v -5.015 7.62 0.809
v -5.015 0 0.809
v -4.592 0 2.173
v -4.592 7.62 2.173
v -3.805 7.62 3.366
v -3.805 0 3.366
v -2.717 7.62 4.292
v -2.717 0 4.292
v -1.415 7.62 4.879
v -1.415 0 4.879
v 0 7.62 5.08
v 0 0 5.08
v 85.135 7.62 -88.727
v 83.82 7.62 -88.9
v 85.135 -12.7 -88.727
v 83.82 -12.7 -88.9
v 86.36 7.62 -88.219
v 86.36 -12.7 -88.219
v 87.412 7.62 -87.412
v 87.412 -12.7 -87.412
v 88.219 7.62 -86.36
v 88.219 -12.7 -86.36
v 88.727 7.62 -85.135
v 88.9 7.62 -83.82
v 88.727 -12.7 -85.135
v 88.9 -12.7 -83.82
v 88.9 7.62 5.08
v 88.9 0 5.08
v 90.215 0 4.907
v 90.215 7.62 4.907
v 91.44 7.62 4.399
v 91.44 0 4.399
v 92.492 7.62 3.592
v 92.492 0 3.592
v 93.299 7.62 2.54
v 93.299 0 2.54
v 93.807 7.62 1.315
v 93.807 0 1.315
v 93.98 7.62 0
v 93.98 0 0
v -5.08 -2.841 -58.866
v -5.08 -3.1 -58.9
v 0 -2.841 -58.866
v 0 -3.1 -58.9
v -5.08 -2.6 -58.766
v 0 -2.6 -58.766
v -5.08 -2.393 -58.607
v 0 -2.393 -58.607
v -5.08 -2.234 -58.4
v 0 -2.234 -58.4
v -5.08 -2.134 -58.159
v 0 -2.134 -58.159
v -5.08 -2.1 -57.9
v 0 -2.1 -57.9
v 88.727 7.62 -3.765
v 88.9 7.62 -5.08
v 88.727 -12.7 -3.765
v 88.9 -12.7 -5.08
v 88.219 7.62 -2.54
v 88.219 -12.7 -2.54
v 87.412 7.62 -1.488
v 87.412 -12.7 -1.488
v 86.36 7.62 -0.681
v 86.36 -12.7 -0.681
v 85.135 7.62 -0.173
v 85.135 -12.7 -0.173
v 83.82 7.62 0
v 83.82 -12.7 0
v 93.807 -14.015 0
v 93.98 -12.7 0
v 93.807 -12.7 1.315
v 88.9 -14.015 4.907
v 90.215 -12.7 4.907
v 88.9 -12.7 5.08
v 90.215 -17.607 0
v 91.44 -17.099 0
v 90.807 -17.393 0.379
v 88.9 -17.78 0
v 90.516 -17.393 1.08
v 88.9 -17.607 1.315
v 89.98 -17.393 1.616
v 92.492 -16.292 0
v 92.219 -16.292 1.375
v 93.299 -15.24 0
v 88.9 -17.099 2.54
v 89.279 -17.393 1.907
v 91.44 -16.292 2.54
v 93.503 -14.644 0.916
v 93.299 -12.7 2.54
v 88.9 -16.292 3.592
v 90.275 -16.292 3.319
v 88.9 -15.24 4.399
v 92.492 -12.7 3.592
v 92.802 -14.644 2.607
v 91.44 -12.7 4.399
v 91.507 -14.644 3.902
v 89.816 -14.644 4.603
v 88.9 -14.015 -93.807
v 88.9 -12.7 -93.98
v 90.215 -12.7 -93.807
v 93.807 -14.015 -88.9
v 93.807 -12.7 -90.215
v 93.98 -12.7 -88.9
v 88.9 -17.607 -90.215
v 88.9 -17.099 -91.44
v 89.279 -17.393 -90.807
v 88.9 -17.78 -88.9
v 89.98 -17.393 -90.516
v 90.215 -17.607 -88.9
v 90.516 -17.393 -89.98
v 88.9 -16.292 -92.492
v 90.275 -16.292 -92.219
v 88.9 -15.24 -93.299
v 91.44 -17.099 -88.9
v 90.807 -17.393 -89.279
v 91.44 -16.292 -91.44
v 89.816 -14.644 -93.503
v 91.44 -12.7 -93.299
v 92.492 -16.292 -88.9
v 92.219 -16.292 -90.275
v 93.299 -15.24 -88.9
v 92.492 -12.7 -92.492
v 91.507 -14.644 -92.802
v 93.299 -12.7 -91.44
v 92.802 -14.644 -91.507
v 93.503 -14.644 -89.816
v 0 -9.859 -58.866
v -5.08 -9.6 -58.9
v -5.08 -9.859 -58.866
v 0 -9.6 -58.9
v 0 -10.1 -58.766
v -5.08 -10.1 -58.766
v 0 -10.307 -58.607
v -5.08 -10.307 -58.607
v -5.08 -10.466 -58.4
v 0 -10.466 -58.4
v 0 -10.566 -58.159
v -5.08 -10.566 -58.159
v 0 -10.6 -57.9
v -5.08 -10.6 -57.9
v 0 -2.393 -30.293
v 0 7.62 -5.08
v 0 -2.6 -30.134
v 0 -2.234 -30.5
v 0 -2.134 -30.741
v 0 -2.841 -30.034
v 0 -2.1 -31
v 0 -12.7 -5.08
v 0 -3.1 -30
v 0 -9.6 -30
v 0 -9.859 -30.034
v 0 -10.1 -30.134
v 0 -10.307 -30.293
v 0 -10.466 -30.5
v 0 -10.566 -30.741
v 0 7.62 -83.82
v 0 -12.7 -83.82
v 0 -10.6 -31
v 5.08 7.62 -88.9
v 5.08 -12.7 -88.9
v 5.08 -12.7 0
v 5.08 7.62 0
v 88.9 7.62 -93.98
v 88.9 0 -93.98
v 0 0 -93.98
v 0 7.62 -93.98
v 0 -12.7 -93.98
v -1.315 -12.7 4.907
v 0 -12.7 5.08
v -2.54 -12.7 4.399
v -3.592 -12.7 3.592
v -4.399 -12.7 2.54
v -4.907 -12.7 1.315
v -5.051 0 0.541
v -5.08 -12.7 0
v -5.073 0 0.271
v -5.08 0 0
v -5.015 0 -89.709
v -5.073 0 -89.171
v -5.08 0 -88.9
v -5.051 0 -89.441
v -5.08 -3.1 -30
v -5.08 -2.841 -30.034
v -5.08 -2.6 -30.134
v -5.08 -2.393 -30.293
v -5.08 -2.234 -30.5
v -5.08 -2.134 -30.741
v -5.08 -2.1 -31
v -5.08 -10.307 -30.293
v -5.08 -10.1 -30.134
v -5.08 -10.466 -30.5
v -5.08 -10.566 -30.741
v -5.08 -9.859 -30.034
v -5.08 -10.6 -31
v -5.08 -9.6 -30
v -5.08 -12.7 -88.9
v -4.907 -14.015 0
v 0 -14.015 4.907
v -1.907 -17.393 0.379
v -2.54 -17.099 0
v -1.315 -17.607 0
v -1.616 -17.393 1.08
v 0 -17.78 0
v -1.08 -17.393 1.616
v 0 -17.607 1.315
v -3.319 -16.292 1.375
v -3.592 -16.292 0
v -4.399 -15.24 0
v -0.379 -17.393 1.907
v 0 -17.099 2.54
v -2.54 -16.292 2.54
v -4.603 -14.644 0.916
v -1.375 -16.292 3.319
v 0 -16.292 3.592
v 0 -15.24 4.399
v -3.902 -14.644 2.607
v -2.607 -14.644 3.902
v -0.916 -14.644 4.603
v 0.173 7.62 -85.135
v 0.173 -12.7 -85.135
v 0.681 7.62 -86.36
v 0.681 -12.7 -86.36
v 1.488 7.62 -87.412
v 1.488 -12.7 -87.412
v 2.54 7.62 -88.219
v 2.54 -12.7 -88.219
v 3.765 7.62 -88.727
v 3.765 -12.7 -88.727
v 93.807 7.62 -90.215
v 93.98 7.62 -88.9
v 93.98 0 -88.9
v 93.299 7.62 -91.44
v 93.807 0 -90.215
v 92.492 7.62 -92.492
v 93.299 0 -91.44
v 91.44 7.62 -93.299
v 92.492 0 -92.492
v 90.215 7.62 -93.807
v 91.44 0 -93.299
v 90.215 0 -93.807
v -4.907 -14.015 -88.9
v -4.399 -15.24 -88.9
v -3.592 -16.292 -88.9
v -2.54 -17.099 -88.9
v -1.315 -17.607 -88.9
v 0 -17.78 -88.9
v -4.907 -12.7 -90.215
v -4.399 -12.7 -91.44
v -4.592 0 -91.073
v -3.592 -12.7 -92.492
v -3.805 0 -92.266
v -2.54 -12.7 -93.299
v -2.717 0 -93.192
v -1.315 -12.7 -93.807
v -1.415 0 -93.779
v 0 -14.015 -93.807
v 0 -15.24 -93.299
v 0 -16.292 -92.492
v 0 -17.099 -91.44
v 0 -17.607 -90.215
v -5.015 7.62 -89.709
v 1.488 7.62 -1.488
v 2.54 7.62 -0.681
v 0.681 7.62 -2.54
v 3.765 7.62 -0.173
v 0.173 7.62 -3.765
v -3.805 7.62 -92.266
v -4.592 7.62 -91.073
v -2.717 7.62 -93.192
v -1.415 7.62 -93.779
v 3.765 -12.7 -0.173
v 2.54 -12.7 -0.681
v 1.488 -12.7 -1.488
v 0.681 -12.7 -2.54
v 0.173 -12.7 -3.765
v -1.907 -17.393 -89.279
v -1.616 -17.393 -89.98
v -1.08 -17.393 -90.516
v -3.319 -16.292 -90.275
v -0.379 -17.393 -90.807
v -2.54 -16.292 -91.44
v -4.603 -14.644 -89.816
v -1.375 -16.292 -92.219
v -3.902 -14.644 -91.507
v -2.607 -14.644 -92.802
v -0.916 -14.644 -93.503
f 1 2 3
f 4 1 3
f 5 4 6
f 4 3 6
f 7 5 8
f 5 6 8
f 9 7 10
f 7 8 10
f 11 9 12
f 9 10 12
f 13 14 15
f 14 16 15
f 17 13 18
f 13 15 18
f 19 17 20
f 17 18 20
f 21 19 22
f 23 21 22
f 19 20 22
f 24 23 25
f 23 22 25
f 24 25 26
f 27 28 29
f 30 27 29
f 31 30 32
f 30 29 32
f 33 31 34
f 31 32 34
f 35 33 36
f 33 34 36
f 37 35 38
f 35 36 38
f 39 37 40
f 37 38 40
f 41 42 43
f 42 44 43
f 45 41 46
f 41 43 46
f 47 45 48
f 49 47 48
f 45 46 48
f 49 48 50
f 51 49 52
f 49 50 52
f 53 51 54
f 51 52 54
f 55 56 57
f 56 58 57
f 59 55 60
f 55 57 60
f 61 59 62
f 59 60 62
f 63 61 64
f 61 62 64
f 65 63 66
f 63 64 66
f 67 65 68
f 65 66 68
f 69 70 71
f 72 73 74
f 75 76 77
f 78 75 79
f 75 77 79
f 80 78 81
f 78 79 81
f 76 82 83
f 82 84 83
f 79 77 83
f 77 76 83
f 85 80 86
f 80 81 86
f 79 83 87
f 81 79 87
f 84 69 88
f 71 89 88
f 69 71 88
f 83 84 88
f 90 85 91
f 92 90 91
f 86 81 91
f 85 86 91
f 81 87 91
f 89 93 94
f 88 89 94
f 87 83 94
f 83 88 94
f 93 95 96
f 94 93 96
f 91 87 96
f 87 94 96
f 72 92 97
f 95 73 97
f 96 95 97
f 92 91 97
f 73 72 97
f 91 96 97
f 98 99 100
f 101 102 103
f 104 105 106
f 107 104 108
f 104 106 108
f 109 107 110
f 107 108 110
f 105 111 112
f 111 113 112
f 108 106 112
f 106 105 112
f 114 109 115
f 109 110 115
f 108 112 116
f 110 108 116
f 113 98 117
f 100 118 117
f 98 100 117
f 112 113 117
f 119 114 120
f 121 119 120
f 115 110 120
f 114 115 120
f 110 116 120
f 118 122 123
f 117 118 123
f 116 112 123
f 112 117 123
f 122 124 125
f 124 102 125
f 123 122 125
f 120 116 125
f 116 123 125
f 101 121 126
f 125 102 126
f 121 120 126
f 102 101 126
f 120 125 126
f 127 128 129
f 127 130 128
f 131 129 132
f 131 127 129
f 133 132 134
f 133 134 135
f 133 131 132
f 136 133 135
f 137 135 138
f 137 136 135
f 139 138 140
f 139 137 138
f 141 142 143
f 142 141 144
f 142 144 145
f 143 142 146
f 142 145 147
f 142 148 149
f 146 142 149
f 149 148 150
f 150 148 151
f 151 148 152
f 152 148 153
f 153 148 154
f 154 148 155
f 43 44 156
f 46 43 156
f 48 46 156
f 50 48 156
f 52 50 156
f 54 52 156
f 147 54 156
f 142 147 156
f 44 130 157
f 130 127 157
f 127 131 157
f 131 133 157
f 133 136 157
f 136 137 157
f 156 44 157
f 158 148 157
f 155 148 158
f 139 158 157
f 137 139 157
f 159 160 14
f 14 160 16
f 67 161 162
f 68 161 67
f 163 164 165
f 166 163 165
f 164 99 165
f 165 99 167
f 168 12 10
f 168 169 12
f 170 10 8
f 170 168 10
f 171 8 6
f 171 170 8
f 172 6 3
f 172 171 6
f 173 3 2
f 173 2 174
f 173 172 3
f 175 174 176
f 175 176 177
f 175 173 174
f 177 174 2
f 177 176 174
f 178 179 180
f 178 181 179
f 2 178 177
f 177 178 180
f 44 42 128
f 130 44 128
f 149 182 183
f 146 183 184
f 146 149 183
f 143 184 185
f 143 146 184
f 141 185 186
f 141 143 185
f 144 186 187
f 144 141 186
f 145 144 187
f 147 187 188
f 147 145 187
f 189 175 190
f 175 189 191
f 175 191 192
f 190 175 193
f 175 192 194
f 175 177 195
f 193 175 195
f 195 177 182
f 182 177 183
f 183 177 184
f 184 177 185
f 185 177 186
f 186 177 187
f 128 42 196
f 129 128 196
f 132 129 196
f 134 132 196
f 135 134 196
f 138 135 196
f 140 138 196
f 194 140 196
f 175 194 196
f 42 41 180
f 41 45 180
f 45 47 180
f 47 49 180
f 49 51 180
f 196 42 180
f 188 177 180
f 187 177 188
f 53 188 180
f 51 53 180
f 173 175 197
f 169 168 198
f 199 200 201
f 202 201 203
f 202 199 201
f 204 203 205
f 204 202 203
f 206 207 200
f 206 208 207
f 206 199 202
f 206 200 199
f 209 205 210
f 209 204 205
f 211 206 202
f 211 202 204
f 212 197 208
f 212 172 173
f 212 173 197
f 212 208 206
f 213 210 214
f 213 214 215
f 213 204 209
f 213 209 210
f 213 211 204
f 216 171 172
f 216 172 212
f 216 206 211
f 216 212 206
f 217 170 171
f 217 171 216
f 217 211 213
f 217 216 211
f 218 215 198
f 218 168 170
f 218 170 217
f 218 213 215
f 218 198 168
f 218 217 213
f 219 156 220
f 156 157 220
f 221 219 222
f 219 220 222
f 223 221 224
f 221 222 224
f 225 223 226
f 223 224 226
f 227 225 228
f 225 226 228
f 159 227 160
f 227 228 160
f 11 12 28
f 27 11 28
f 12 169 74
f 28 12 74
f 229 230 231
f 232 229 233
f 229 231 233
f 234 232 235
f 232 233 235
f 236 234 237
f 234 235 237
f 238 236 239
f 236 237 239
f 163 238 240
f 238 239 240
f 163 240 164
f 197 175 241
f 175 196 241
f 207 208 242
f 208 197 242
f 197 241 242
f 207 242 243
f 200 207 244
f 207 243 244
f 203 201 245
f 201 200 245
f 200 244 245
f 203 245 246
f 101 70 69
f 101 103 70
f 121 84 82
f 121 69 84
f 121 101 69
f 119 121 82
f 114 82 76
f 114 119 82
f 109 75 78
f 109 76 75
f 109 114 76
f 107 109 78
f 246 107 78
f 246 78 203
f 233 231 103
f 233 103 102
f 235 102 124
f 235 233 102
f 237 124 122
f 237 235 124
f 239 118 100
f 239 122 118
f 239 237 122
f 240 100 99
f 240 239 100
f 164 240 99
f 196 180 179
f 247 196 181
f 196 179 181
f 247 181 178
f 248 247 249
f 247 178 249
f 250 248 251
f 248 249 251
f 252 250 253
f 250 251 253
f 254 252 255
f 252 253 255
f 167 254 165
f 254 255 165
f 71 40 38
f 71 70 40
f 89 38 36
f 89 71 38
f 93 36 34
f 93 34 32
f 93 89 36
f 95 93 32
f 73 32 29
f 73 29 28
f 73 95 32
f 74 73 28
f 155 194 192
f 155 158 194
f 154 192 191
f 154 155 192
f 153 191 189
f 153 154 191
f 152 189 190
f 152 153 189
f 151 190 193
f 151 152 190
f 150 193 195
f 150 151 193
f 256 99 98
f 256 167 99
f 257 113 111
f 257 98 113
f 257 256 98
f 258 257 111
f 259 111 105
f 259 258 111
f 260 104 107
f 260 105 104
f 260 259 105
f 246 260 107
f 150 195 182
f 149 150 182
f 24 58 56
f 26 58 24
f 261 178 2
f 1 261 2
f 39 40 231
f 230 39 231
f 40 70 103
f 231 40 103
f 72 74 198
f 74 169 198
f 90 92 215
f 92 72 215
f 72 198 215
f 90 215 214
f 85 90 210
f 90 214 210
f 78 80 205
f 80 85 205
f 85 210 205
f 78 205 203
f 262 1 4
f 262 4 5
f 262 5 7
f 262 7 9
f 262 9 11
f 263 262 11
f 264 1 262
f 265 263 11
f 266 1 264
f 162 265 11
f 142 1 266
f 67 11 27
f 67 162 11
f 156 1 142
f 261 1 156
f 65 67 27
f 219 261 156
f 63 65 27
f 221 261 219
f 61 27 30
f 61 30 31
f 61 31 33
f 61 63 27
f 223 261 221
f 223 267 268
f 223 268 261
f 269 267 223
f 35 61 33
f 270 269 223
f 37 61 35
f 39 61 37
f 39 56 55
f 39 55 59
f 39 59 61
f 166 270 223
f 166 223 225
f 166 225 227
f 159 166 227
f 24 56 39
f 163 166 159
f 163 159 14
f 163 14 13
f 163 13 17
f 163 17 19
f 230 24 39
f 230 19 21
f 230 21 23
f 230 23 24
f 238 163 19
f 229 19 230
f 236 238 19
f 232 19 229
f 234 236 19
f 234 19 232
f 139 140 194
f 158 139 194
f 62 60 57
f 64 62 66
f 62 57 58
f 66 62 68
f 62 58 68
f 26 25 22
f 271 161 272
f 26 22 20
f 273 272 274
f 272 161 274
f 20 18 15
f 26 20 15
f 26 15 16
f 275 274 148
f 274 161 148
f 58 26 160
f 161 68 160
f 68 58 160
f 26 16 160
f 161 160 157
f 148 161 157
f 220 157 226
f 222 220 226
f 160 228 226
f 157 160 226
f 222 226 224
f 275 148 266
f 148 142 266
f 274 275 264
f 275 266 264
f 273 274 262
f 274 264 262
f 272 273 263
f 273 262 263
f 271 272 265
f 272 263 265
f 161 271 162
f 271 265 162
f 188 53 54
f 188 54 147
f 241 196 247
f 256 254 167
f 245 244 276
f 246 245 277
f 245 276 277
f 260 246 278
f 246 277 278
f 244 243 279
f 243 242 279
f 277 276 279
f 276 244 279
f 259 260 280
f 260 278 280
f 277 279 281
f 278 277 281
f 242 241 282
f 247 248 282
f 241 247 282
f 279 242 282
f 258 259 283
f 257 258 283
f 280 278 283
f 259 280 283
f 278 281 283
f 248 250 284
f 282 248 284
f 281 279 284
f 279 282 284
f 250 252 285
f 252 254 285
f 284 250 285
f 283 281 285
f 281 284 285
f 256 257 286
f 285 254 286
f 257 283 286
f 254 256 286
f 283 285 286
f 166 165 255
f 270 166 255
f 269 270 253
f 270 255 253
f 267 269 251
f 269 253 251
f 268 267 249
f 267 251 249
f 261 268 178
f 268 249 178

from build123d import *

# Parameters (mm, degrees)
SKETCH1_W                = 5.08
SKETCH1_H                = 5.08
BOSS_EXTRUDE1_DEPTH      = 12.7
SKETCH2_W                = 99.06
SKETCH2_H                = 99.06
BOSS_EXTRUDE2_DEPTH      = 5.08
FILLET1_R                = 5.08
BOSS_EXTRUDE3_DEPTH      = 10.922
BOSS_EXTRUDE3_DEPTH_BACK = 17.78
SKETCH4_R                = 2.032
BOSS_EXTRUDE4_DEPTH      = 12.7
SKETCH7_R                = 1.143
CUT_EXTRUDE4_DEPTH       = 10.922
SKETCH8_R                = 2.032
CUT_EXTRUDE5_DEPTH       = 12.7
SKETCH5_R                = 1.905
SKETCH5_R_2              = 1.693431134
CUT_EXTRUDE6_DEPTH       = 5.08
SKETCH9_R                = 1.905
SKETCH9_R_2              = 1.016
BOSS_EXTRUDE5_DEPTH      = 3.81
SKETCH6_R                = 1.905
CUT_EXTRUDE7_DEPTH       = 5.08
SKETCH10_R               = 1.905
SKETCH10_R_2             = 1.016
SKETCH10_R_3             = 2.032
BOSS_EXTRUDE8_DEPTH      = 3.81
SKETCH11_W               = 88.9
SKETCH11_H               = 88.9
BOSS_EXTRUDE9_DEPTH      = 7.62
FILLET5_R                = 5.08
SKETCH12_W               = 62.122594268
SKETCH12_H               = 12.7
BOSS_EXTRUDE10_DEPTH     = 5.08
BOSS_EXTRUDE11_START     = -5.08
SKETCH13_W               = 40.450281948
SKETCH13_H               = 12.7
BOSS_EXTRUDE11_DEPTH     = 5.08
SKETCH14_W               = 28.9
SKETCH14_H               = 4.25
CUT_EXTRUDE8_DEPTH       = 5.08
FILLET6_R                = 1


with BuildPart() as part:
    # Sketch1 → Boss-Extrude1 (new body)
    with BuildSketch(Plane(origin=(0, 0, 0), x_dir=(1, 0, 0), z_dir=(0, 1, 0))):
        Polygon((-5.08, 0), (0, 0), (0, 88.9), (88.9, 88.9), (88.9, 93.98), (-5.08, 93.98), align=None)
        Polygon((88.9, 0), (0, 0), (0, -5.08), (93.98, -5.08), (93.98, 88.9), (88.9, 88.9), align=None)
        with Locations((-2.54, -2.54)):
            Rectangle(SKETCH1_W, SKETCH1_H)
        with Locations((91.44, 91.44)):
            Rectangle(SKETCH1_W, SKETCH1_H)
    extrude(amount=-BOSS_EXTRUDE1_DEPTH)

    # Sketch2 → Boss-Extrude2 (add)
    with BuildSketch(Plane(origin=(0, -12.7, 0), x_dir=(-1, 0, 0), z_dir=(0, -1, 0))):
        with Locations((-44.45, 44.45)):
            Rectangle(SKETCH2_W, SKETCH2_H)
    extrude(amount=BOSS_EXTRUDE2_DEPTH)

    # Fillet1
    fillet1_edges = [part.edges().sort_by_distance(p)[0] for p in [
        (-5.08, -8.89, 5.08),
        (-5.08, -8.89, -93.98),
        (93.98, -8.89, -93.98),
        (93.98, -8.89, 5.08),
        (-5.08, -17.78, -44.45),
        (44.45, -17.78, -93.98),
        (93.98, -17.78, -44.45),
        (44.45, -17.78, 5.08),
    ]]
    fillet(fillet1_edges, radius=FILLET1_R)

    # Sketch3 → Boss-Extrude3 (add, two sides)
    with BuildSketch(Plane(origin=(0, 0, 0), x_dir=(1, 0, 0), z_dir=(0, 1, 0))) as boss_extrude3_sk:
        with BuildLine():
            ThreePointArc((16.638673661, 17.781673661), (15.582679356, 17.076080824), (15.83045061, 15.83045061))
            Line((15.83045061, 15.83045061), (16.638673661, 16.638673661))
            Line((16.638673661, 16.638673661), (16.638673661, 17.781673661))
        make_face()
        with BuildLine():
            Line((16.638673661, 17.781673661), (16.638673661, 16.638673661))
            Line((16.638673661, 16.638673661), (17.446896712, 17.446896712))
            ThreePointArc((17.446896712, 17.446896712), (17.076080824, 17.694667967), (16.638673661, 17.781673661))
        make_face()
        with BuildLine():
            Line((16.638673661, 16.638673661), (15.83045061, 15.83045061))
            ThreePointArc((15.83045061, 15.83045061), (17.076080824, 15.582679356), (17.781673661, 16.638673661))
            Line((17.781673661, 16.638673661), (16.638673661, 16.638673661))
        make_face()
        with BuildLine():
            Line((17.446896712, 17.446896712), (16.638673661, 16.638673661))
            Line((16.638673661, 16.638673661), (17.781673661, 16.638673661))
            ThreePointArc((17.781673661, 16.638673661), (17.694667967, 17.076080824), (17.446896712, 17.446896712))
        make_face()
        with BuildLine():
            ThreePointArc((71.453103288, 17.446896712), (71.205332033, 17.076080824), (71.118326339, 16.638673661))
            Line((71.118326339, 16.638673661), (72.261326339, 16.638673661))
            Line((72.261326339, 16.638673661), (71.453103288, 17.446896712))
        make_face()
        with BuildLine():
            Line((72.261326339, 16.638673661), (71.118326339, 16.638673661))
            ThreePointArc((71.118326339, 16.638673661), (71.823919176, 15.582679356), (73.06954939, 15.83045061))
            Line((73.06954939, 15.83045061), (72.261326339, 16.638673661))
        make_face()
        with BuildLine():
            Line((72.261326339, 17.781673661), (72.261326339, 16.638673661))
            Line((72.261326339, 16.638673661), (73.06954939, 15.83045061))
            ThreePointArc((73.06954939, 15.83045061), (73.317320644, 16.201266498), (73.404326339, 16.638673661))
            ThreePointArc((73.404326339, 16.638673661), (73.06954939, 17.446896712), (72.261326339, 17.781673661))
        make_face()
        with BuildLine():
            Line((71.453103288, 17.446896712), (72.261326339, 16.638673661))
            Line((72.261326339, 16.638673661), (72.261326339, 17.781673661))
            ThreePointArc((72.261326339, 17.781673661), (71.823919176, 17.694667967), (71.453103288, 17.446896712))
        make_face()
        with BuildLine():
            ThreePointArc((71.118326339, 72.261326339), (71.205332033, 71.823919176), (71.453103288, 71.453103288))
            Line((71.453103288, 71.453103288), (72.261326339, 72.261326339))
            Line((72.261326339, 72.261326339), (71.118326339, 72.261326339))
        make_face()
        with BuildLine():
            Line((71.118326339, 72.261326339), (72.261326339, 72.261326339))
            Line((72.261326339, 72.261326339), (73.06954939, 73.06954939))
            ThreePointArc((73.06954939, 73.06954939), (71.823919176, 73.317320644), (71.118326339, 72.261326339))
        make_face()
        with BuildLine():
            Line((72.261326339, 72.261326339), (71.453103288, 71.453103288))
            ThreePointArc((71.453103288, 71.453103288), (71.823919176, 71.205332033), (72.261326339, 71.118326339))
            Line((72.261326339, 71.118326339), (72.261326339, 72.261326339))
        make_face()
        with BuildLine():
            Line((73.06954939, 73.06954939), (72.261326339, 72.261326339))
            Line((72.261326339, 72.261326339), (72.261326339, 71.118326339))
            ThreePointArc((72.261326339, 71.118326339), (73.06954939, 71.453103288), (73.404326339, 72.261326339))
            ThreePointArc((73.404326339, 72.261326339), (73.317320644, 72.698733502), (73.06954939, 73.06954939))
        make_face()
        with BuildLine():
            ThreePointArc((15.83045061, 73.06954939), (15.582679356, 71.823919176), (16.638673661, 71.118326339))
            Line((16.638673661, 71.118326339), (16.638673661, 72.261326339))
            Line((16.638673661, 72.261326339), (15.83045061, 73.06954939))
        make_face()
        with BuildLine():
            Line((16.638673661, 72.261326339), (16.638673661, 71.118326339))
            ThreePointArc((16.638673661, 71.118326339), (17.076080824, 71.205332033), (17.446896712, 71.453103288))
            Line((17.446896712, 71.453103288), (16.638673661, 72.261326339))
        make_face()
        with BuildLine():
            Line((17.781673661, 72.261326339), (16.638673661, 72.261326339))
            Line((16.638673661, 72.261326339), (17.446896712, 71.453103288))
            ThreePointArc((17.446896712, 71.453103288), (17.694667967, 71.823919176), (17.781673661, 72.261326339))
        make_face()
        with BuildLine():
            Line((15.83045061, 73.06954939), (16.638673661, 72.261326339))
            Line((16.638673661, 72.261326339), (17.781673661, 72.261326339))
            ThreePointArc((17.781673661, 72.261326339), (17.076080824, 73.317320644), (15.83045061, 73.06954939))
        make_face()
    extrude(amount=BOSS_EXTRUDE3_DEPTH)
    extrude(boss_extrude3_sk.sketch, amount=-BOSS_EXTRUDE3_DEPTH_BACK)

    # Sketch4 → Boss-Extrude4 (add)
    with BuildSketch(Plane(origin=(0, 0, 0), x_dir=(1, 0, 0), z_dir=(0, 1, 0))):
        with Locations((72.261326339, 16.638673661)):
            Circle(SKETCH4_R)
        with Locations((16.638673661, 16.638673661)):
            Circle(SKETCH4_R)
        with Locations((72.261326339, 72.261326339)):
            Circle(SKETCH4_R)
        with Locations((16.638673661, 72.261326339)):
            Circle(SKETCH4_R)
    extrude(amount=-BOSS_EXTRUDE4_DEPTH)

    # Sketch7 → Cut-Extrude4 (cut)
    with BuildSketch(Plane(origin=(0, 10.922, 0), x_dir=(1, 0, 0), z_dir=(0, 1, 0))):
        with Locations((72.261326339, 72.261326339)):
            Circle(SKETCH7_R)
        with Locations((16.638673661, 72.261326339)):
            Circle(SKETCH7_R)
        with Locations((72.261326339, 16.638673661)):
            Circle(SKETCH7_R)
        with Locations((16.638673661, 16.638673661)):
            Circle(SKETCH7_R)
    extrude(amount=-CUT_EXTRUDE4_DEPTH, mode=Mode.SUBTRACT)

    # Sketch8 → Cut-Extrude5 (cut)
    with BuildSketch(Plane(origin=(0, 0, 0), x_dir=(1, 0, 0), z_dir=(0, 1, 0))):
        with Locations((72.261326339, 16.638673661)):
            Circle(SKETCH8_R)
        with Locations((72.261326339, 72.261326339)):
            Circle(SKETCH8_R)
        with Locations((16.638673661, 72.261326339)):
            Circle(SKETCH8_R)
        with Locations((16.638673661, 16.638673661)):
            Circle(SKETCH8_R)
    extrude(amount=-CUT_EXTRUDE5_DEPTH, mode=Mode.SUBTRACT)

    # Sketch5 → Cut-Extrude6 (cut)
    with BuildSketch(Plane.XY.offset(5.08)):
        with Locations((30.48, -6.35)):
            Circle(SKETCH5_R)
        with BuildLine():
            ThreePointArc((44.45, -4.445), (43.201840683, -4.910860216), (42.564146215, -6.080592316))
            Line((42.564146215, -6.080592316), (44.45, -6.35))
            Line((44.45, -6.35), (46.335853785, -6.080592316))
            ThreePointArc((46.335853785, -6.080592316), (45.698159317, -4.910860216), (44.45, -4.445))
        make_face()
        with BuildLine():
            Line((44.45, -6.35), (42.564146215, -6.080592316))
            ThreePointArc((42.564146215, -6.080592316), (42.545, -6.35), (42.564146215, -6.619407684))
            Line((42.564146215, -6.619407684), (44.45, -6.35))
        make_face()
        with BuildLine():
            Line((46.335853785, -6.080592316), (44.45, -6.35))
            Line((44.45, -6.35), (46.335853785, -6.619407684))
            ThreePointArc((46.335853785, -6.619407684), (46.350207418, -6.485043583), (46.355, -6.35))
            ThreePointArc((46.355, -6.35), (46.350207418, -6.214956417), (46.335853785, -6.080592316))
        make_face()
        with BuildLine():
            Line((46.335853785, -6.619407684), (44.45, -6.35))
            Line((44.45, -6.35), (42.564146215, -6.619407684))
            ThreePointArc((42.564146215, -6.619407684), (43.201840683, -7.789139784), (44.45, -8.255))
            ThreePointArc((44.45, -8.255), (45.698159317, -7.789139784), (46.335853785, -6.619407684))
        make_face()
        with Locations((58.418397854, -6.561568866)):
            Circle(SKETCH5_R_2)
    extrude(amount=-CUT_EXTRUDE6_DEPTH, mode=Mode.SUBTRACT)

    # Sketch9 → Boss-Extrude5 (add)
    with BuildSketch(Plane(origin=(0, 0, 0), x_dir=(-1, 0, 0), z_dir=(0, 0, -1))):
        with Locations((-58.418397854, -6.561568866)):
            Circle(SKETCH9_R)
        with Locations((-58.418397854, -6.561568866)):
            Circle(SKETCH9_R_2, mode=Mode.SUBTRACT)
        with Locations((-44.45, -6.35)):
            Circle(SKETCH9_R)
        with Locations((-44.45, -6.35)):
            Circle(SKETCH9_R_2, mode=Mode.SUBTRACT)
        with Locations((-30.48, -6.35)):
            Circle(SKETCH9_R)
        with Locations((-30.48, -6.35)):
            Circle(SKETCH9_R_2, mode=Mode.SUBTRACT)
    extrude(amount=-BOSS_EXTRUDE5_DEPTH)

    # Sketch6 → Cut-Extrude7 (cut)
    with BuildSketch(Plane.ZY.offset(5.08)):
        with BuildLine():
            Line((-54.653499975, -4.892357146), (-56.649300025, -4.607242854))
            ThreePointArc((-56.649300025, -4.607242854), (-57.785, -6.35), (-56.649300025, -8.092757146))
            Line((-56.649300025, -8.092757146), (-54.653499975, -7.807642854))
            ThreePointArc((-54.653499975, -7.807642854), (-53.975, -6.35), (-54.653499975, -4.892357146))
        make_face()
        with Locations((-67.31, -6.35)):
            Circle(SKETCH6_R)
        with Locations((-44.45, -6.35)):
            Circle(SKETCH6_R)
        with BuildLine():
            Line((-32.217974947, -4.60256785), (-34.279225053, -4.89703215))
            ThreePointArc((-34.279225053, -4.89703215), (-34.942696883, -6.35), (-34.279225053, -7.80296785))
            Line((-34.279225053, -7.80296785), (-32.217974947, -8.09743215))
            ThreePointArc((-32.217974947, -8.09743215), (-31.097303117, -6.35), (-32.217974947, -4.60256785))
        make_face()
        with Locations((-21.59, -6.35)):
            Circle(SKETCH6_R)
    extrude(amount=-CUT_EXTRUDE7_DEPTH, mode=Mode.SUBTRACT)

    # Sketch10 → Boss-Extrude8 (add)
    with BuildSketch(Plane(origin=(0, 0, 0), x_dir=(0, 0, -1), z_dir=(1, 0, 0))):
        with Locations((21.59, -6.35)):
            Circle(SKETCH10_R)
        with Locations((21.59, -6.35)):
            Circle(SKETCH10_R_2, mode=Mode.SUBTRACT)
        with Locations((33.02, -6.35)):
            Circle(SKETCH10_R_3)
        with Locations((33.02, -6.35)):
            Circle(SKETCH10_R_2, mode=Mode.SUBTRACT)
        with Locations((44.45, -6.35)):
            Circle(SKETCH10_R)
        with Locations((44.45, -6.35)):
            Circle(SKETCH10_R_2, mode=Mode.SUBTRACT)
        with Locations((55.88, -6.35)):
            Circle(SKETCH10_R)
        with Locations((55.88, -6.35)):
            Circle(SKETCH10_R_2, mode=Mode.SUBTRACT)
        with Locations((67.31, -6.35)):
            Circle(SKETCH10_R)
        with Locations((67.31, -6.35)):
            Circle(SKETCH10_R_2, mode=Mode.SUBTRACT)
    extrude(amount=-BOSS_EXTRUDE8_DEPTH)

    # Sketch11 → Boss-Extrude9 (add)
    with BuildSketch(Plane(origin=(0, 0, 0), x_dir=(1, 0, 0), z_dir=(0, 1, 0))):
        with BuildLine():
            ThreePointArc((93.98, 88.9), (92.492102448, 92.492102448), (88.9, 93.98))
            Line((88.9, 93.98), (0, 93.98))
            ThreePointArc((0, 93.98), (-3.29371971, 92.767532866), (-5.015184737, 89.708901759))
            Line((-5.015184737, 89.708901759), (-5.015184737, -0.808901759))
            ThreePointArc((-5.015184737, -0.808901759), (-3.29371971, -3.867532866), (0, -5.08))
            Line((0, -5.08), (88.9, -5.08))
            ThreePointArc((88.9, -5.08), (92.492102448, -3.592102448), (93.98, 0))
            Line((93.98, 0), (93.98, 88.9))
        make_face()
        with Locations((44.45, 44.45)):
            Rectangle(SKETCH11_W, SKETCH11_H, mode=Mode.SUBTRACT)
    extrude(amount=BOSS_EXTRUDE9_DEPTH)

    # Fillet5
    fillet5_edges = [part.edges().sort_by_distance(p)[0] for p in [
        (88.9, -2.54, 0),
        (88.9, -2.54, -88.9),
        (0, -2.54, -88.9),
        (0, -2.54, 0),
    ]]
    fillet(fillet5_edges, radius=FILLET5_R)

    # Sketch12 → Boss-Extrude10 (add)
    with BuildSketch(Plane.ZY.offset(5.08)):
        with Locations((-45.534139922, -6.35)):
            Rectangle(SKETCH12_W, SKETCH12_H)
    extrude(amount=-BOSS_EXTRUDE10_DEPTH)

    # Sketch13 → Boss-Extrude11 (add)
    with BuildSketch(Plane.XY.offset(5.08).offset(BOSS_EXTRUDE11_START)):
        with Locations((45.477393759, -6.35)):
            Rectangle(SKETCH13_W, SKETCH13_H)
    extrude(amount=BOSS_EXTRUDE11_DEPTH)

    # Sketch14 → Cut-Extrude8 (cut)
    with BuildSketch(Plane.ZY.offset(5.08)):
        with Locations((-44.45, -4.225)):
            Rectangle(SKETCH14_W, SKETCH14_H)
        with Locations((-44.45, -8.475)):
            Rectangle(SKETCH14_W, SKETCH14_H)
    extrude(amount=-CUT_EXTRUDE8_DEPTH, mode=Mode.SUBTRACT)

    # Fillet6
    fillet6_edges = [part.edges().sort_by_distance(p)[0] for p in [
        (-2.54, -2.1, -30),
        (-2.54, -10.6, -30),
        (-2.54, -10.6, -58.9),
        (-2.54, -2.1, -58.9),
    ]]
    fillet(fillet6_edges, radius=FILLET6_R)


solid = part.part
